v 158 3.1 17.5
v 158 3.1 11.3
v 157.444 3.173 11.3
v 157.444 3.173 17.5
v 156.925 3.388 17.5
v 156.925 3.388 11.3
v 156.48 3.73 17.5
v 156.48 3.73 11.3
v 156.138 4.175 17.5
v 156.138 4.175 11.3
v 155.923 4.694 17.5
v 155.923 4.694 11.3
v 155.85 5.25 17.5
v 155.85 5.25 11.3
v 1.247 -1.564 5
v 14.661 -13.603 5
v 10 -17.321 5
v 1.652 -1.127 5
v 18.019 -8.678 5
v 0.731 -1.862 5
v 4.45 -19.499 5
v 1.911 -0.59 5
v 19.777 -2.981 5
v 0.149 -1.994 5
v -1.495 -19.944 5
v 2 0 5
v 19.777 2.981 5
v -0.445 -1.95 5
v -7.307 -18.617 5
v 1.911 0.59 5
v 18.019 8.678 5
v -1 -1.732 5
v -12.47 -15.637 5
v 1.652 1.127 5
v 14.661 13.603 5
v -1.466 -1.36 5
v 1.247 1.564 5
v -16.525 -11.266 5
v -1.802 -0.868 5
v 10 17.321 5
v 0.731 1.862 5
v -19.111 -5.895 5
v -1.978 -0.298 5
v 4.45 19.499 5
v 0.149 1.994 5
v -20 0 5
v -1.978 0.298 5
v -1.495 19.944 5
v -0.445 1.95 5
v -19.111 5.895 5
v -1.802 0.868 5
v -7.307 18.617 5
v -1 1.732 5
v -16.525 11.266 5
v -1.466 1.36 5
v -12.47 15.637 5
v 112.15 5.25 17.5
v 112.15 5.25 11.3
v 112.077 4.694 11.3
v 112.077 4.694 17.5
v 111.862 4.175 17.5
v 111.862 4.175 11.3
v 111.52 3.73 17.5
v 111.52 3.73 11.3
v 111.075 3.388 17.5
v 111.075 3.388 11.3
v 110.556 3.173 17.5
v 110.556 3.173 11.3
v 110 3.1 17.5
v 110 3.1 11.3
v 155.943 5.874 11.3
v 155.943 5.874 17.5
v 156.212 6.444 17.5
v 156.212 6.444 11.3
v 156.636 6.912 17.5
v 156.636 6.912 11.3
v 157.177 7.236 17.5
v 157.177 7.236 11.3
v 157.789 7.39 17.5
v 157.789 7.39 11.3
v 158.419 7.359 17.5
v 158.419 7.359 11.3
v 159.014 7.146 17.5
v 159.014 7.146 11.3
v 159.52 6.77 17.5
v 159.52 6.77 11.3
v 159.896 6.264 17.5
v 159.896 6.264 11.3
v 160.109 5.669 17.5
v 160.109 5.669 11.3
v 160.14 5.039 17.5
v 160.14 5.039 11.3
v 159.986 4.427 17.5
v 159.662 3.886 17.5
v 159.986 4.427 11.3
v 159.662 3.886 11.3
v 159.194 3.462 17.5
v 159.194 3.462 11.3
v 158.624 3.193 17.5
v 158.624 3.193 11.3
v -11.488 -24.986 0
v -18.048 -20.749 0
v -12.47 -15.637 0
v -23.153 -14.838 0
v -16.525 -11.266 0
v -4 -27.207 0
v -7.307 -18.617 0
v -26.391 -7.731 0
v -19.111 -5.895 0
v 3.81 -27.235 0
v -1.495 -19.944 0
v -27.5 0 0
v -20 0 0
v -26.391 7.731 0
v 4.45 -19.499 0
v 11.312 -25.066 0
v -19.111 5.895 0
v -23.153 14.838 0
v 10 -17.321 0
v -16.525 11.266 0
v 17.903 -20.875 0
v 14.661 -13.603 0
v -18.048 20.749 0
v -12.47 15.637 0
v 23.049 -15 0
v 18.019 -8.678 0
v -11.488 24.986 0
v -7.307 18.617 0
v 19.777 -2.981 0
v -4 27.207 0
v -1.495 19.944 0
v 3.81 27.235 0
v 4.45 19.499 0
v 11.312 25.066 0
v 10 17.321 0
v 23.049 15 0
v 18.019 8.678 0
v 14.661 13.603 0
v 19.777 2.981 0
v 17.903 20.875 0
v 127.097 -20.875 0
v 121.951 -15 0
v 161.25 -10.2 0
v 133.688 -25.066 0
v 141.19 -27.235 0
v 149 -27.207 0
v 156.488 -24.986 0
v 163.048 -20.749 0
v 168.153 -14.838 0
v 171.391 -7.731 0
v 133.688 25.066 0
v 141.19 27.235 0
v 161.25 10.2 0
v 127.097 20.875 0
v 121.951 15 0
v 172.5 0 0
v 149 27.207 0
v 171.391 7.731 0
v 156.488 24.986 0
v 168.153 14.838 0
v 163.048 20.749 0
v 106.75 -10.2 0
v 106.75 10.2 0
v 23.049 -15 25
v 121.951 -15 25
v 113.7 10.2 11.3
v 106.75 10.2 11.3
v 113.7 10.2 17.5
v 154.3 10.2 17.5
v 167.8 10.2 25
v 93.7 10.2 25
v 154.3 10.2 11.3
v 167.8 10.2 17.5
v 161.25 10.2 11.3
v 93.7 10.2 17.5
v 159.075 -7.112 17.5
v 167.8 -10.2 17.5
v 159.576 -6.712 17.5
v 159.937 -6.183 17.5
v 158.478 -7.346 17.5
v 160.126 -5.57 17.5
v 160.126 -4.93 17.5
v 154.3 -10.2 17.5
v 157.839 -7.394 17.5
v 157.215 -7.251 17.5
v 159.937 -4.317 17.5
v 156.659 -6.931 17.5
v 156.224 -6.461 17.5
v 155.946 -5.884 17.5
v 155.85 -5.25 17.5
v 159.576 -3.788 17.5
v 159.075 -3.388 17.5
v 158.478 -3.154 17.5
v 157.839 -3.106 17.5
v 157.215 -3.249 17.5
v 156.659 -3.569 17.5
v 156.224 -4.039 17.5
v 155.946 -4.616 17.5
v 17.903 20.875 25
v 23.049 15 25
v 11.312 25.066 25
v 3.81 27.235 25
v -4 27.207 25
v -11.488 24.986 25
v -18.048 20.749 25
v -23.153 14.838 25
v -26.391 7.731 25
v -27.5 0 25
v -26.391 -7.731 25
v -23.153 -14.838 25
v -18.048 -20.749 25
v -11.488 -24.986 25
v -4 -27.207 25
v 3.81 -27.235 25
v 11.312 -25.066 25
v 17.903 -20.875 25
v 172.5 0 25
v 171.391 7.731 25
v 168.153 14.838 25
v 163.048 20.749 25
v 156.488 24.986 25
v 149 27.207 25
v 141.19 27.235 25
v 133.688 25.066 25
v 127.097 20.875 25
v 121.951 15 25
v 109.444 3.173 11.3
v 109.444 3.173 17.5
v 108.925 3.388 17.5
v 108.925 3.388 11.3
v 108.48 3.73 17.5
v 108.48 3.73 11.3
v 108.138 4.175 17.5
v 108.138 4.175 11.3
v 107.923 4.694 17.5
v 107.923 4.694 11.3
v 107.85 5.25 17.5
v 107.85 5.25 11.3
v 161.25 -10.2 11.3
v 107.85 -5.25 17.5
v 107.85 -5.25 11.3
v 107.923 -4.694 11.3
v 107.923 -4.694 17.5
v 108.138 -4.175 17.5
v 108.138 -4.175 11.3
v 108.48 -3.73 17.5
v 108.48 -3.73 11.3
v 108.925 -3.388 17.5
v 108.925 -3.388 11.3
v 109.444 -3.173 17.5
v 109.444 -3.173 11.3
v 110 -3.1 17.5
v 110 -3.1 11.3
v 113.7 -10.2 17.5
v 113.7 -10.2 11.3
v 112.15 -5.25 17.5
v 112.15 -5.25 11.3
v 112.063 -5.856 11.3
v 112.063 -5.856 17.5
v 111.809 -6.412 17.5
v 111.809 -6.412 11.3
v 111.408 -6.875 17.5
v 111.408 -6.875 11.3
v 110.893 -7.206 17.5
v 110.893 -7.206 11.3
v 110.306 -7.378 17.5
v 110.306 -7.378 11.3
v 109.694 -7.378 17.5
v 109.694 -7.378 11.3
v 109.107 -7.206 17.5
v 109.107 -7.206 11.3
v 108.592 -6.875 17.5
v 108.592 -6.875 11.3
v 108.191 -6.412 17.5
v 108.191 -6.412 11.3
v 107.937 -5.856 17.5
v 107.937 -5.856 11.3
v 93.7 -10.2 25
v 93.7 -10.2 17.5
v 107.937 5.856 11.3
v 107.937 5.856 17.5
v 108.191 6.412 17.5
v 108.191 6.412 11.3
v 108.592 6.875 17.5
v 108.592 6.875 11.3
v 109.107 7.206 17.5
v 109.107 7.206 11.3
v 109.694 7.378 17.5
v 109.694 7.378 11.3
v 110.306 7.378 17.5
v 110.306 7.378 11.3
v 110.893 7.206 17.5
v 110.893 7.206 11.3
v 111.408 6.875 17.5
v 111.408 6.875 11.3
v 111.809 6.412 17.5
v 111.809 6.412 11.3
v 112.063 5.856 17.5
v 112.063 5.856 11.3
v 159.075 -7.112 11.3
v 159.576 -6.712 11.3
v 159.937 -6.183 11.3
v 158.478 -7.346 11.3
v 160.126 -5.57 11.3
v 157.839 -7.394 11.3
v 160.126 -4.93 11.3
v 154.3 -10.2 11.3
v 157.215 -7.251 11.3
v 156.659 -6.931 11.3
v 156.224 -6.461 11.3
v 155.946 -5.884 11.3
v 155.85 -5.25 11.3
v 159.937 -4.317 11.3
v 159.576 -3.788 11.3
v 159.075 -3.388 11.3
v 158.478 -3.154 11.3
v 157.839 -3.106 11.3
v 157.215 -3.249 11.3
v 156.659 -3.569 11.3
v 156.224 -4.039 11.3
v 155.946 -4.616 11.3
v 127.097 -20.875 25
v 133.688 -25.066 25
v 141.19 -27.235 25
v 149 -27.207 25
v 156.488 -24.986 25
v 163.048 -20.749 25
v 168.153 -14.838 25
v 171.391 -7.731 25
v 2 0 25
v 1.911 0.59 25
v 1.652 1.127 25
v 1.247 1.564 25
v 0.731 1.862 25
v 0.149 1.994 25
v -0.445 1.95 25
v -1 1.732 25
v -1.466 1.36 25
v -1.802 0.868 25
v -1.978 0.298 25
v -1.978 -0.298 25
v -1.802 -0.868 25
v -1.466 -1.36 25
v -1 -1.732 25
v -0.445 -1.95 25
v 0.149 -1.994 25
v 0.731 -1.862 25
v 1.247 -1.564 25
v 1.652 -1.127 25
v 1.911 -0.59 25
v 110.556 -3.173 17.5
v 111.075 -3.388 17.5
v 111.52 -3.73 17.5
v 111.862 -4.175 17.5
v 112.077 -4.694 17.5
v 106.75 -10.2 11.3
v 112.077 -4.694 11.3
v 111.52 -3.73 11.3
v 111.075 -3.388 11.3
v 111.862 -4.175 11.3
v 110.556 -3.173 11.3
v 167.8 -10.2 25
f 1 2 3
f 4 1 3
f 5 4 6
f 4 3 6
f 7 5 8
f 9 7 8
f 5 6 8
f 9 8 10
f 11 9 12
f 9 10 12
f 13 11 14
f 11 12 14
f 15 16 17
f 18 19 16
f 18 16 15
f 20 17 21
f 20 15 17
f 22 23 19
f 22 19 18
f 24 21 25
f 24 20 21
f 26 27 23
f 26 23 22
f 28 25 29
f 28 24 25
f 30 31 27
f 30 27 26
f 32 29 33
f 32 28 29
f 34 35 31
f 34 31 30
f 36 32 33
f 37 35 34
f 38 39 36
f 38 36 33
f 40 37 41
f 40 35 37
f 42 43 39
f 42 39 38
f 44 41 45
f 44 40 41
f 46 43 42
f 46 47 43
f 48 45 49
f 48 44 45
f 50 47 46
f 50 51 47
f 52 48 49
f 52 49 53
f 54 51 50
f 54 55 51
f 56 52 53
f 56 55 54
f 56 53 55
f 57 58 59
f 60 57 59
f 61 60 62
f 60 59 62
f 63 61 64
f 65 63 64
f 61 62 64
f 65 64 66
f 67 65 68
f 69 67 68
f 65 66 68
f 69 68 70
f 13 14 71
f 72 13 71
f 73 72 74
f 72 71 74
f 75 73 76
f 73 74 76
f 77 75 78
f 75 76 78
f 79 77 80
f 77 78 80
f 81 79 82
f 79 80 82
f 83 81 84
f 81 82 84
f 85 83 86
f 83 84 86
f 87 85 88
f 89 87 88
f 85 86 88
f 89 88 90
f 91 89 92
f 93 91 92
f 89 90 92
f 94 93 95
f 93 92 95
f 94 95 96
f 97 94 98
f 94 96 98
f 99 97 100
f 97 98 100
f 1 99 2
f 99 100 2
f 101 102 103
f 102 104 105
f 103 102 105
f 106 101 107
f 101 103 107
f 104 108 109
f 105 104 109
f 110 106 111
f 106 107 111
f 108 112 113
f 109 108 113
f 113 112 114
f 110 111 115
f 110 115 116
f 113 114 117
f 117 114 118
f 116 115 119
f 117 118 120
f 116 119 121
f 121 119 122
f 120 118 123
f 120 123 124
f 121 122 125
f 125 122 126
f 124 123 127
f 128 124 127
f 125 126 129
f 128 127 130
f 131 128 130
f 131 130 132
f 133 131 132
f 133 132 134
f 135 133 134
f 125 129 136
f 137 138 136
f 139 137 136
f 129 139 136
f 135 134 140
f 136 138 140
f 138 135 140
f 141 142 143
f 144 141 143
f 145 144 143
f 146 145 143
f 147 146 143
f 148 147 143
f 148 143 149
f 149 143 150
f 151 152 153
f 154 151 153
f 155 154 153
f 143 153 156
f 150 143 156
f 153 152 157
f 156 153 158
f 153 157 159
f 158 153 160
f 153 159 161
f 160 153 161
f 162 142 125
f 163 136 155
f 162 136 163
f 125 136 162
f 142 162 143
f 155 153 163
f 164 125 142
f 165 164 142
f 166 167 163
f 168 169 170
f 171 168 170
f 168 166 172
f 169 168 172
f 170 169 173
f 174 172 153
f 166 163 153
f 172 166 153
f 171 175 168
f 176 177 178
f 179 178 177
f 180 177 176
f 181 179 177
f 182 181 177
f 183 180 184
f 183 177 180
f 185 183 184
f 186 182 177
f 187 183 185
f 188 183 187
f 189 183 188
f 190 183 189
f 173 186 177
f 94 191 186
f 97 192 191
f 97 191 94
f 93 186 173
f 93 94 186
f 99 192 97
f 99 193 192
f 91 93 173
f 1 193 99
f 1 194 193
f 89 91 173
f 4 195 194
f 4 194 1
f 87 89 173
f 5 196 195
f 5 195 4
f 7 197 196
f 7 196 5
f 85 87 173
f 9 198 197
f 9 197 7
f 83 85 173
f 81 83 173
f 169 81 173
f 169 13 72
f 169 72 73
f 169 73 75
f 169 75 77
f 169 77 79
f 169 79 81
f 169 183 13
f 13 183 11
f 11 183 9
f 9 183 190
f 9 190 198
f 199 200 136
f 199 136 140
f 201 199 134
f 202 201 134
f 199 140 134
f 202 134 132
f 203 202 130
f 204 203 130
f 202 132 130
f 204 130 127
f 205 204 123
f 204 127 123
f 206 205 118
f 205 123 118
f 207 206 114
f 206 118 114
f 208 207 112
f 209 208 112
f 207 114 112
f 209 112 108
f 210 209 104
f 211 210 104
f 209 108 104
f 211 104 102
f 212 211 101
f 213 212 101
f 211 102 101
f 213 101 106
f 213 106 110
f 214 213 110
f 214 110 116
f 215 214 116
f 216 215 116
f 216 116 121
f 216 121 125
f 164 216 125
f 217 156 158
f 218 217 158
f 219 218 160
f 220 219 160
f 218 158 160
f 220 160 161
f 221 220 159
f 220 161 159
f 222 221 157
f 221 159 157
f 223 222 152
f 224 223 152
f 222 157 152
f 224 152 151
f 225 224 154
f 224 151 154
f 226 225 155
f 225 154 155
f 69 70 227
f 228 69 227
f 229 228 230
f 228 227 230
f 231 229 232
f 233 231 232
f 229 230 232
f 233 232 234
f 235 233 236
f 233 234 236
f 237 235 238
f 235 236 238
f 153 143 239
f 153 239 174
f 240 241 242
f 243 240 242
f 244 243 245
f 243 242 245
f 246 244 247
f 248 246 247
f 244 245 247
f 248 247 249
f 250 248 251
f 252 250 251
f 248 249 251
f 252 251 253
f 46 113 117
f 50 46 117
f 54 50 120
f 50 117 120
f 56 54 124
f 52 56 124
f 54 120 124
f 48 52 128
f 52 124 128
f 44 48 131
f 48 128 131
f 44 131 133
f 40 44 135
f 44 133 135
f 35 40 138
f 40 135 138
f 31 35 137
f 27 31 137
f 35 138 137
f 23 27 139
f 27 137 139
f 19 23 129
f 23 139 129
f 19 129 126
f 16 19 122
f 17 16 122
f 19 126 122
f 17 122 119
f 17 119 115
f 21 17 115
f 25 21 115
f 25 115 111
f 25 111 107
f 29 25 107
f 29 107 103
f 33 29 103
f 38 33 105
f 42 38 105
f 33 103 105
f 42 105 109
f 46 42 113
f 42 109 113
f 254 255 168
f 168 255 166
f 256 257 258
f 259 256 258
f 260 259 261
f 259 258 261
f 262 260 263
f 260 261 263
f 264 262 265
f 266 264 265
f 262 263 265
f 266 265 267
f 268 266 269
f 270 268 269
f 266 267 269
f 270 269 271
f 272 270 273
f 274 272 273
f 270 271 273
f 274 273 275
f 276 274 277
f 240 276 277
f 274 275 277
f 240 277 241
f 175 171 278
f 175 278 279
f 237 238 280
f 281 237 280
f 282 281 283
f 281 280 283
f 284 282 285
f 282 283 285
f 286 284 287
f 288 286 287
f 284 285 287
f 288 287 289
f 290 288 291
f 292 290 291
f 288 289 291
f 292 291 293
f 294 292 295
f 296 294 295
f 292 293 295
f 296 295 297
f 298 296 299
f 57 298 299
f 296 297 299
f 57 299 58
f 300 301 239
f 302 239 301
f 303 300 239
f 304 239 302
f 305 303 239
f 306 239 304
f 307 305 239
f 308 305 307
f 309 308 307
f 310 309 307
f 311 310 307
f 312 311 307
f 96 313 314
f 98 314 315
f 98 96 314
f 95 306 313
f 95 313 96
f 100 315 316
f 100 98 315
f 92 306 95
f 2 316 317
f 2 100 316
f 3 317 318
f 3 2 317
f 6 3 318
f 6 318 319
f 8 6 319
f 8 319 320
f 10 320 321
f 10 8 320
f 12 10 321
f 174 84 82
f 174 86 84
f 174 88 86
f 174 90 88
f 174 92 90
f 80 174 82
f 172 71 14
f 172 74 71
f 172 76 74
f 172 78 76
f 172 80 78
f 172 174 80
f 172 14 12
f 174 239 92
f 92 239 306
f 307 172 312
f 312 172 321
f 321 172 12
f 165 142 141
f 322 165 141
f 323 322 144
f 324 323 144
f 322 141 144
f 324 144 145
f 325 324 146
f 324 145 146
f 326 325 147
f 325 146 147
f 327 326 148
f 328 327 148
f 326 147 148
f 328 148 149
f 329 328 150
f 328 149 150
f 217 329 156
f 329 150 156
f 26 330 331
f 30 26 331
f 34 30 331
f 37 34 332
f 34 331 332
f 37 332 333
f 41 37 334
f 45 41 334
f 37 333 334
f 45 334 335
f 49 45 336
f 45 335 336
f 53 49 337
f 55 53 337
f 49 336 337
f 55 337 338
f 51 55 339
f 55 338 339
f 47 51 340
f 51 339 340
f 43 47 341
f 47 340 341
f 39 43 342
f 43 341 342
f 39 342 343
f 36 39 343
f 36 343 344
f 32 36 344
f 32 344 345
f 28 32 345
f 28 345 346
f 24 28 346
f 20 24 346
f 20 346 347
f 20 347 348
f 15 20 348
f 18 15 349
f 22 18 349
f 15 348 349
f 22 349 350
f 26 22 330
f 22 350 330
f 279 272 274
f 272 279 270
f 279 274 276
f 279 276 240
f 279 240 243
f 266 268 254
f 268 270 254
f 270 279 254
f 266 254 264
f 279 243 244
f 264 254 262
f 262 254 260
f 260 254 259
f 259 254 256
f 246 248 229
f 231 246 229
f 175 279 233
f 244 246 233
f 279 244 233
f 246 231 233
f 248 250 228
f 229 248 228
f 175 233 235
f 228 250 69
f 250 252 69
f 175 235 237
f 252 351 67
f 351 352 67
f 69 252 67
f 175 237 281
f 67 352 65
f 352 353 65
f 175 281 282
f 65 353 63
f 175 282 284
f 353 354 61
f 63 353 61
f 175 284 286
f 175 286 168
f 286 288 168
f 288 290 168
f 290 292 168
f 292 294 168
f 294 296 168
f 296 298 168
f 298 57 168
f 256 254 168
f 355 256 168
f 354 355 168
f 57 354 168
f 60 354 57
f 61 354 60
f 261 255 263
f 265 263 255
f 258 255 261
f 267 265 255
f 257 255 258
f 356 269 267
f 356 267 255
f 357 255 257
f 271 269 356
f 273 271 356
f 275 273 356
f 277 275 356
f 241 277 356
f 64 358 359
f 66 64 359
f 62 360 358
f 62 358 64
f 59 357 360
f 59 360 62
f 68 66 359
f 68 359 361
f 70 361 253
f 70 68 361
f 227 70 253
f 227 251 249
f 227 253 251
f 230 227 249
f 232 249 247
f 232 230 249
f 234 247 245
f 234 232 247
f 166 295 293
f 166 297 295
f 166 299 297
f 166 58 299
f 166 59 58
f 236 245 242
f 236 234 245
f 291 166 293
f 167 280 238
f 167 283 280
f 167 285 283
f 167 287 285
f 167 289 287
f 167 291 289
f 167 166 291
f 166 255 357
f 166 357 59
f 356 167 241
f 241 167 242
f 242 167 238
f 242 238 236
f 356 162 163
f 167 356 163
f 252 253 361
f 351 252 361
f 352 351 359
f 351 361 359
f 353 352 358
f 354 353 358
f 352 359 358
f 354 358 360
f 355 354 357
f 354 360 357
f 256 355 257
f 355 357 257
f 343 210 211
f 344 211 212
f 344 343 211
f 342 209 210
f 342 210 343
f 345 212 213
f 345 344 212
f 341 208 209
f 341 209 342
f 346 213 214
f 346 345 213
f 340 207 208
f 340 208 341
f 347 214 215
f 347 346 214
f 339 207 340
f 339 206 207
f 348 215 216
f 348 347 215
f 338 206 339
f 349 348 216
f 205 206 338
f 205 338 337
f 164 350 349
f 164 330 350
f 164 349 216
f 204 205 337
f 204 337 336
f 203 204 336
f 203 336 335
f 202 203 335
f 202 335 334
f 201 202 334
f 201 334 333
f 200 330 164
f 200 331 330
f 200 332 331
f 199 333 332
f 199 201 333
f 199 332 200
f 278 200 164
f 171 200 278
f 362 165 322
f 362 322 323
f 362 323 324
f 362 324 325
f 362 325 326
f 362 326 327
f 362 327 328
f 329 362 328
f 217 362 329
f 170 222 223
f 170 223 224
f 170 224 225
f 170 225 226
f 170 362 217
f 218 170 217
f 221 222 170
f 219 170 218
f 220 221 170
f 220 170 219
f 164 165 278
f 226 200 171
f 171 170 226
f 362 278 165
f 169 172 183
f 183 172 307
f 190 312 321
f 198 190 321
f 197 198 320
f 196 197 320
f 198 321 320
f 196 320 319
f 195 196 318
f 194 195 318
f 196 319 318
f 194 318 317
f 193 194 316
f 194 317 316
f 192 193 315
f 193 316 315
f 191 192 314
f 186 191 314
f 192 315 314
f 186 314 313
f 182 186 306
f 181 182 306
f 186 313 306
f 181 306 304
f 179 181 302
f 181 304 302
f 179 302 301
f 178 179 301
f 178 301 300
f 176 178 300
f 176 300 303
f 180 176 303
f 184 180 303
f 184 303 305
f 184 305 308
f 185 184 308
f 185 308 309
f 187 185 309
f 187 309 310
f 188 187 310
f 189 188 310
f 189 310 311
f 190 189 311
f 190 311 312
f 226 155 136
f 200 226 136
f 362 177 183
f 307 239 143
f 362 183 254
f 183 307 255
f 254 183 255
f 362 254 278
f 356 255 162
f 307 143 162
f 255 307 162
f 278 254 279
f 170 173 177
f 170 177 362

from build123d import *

# Parameters (mm, degrees)
BOSS_EXTRUDE1_DEPTH = 25
SKETCH19_R          = 20
CUT_EXTRUDE14_DEPTH = 5
SKETCH22_R          = 2
CUT_EXTRUDE17_DEPTH = 20
SKETCH23_W          = 54.5
SKETCH23_H          = 20.4
SKETCH23_W_2        = 40.6
CUT_EXTRUDE18_DEPTH = 11.3
CUT_EXTRUDE19_DEPTH = 13.7
SKETCH25_W          = 7.5
SKETCH25_H          = 20.4
CUT_EXTRUDE20_DEPTH = 13.5
CUT_EXTRUDE21_DEPTH = 20
SKETCH27_R          = 2.15
CUT_EXTRUDE22_DEPTH = 12


with BuildPart() as part:
    # Sketch1 → Boss-Extrude1 (new body)
    with BuildSketch(Plane.XY):
        with BuildLine():
            ThreePointArc((172.5, 0), (152.823244805, 26.363741023), (121.951138857, 15))
            Line((121.951138857, 15), (145, 15))
            Line((145, 15), (145, -15))
            Line((145, -15), (121.951138857, -15))
            ThreePointArc((121.951138857, -15), (152.823244805, -26.363741023), (172.5, 0))
        make_face()
        with BuildLine():
            Line((145, 15), (121.951138857, 15))
            ThreePointArc((121.951138857, 15), (117.5, 0), (121.951138857, -15))
            Line((121.951138857, -15), (145, -15))
            Line((145, -15), (145, 15))
        make_face()
        with BuildLine():
            Line((121.951138857, 15), (23.048861143, 15))
            ThreePointArc((23.048861143, 15), (26.363741023, 7.823244805), (27.5, 0))
            ThreePointArc((27.5, 0), (26.363741023, -7.823244805), (23.048861143, -15))
            Line((23.048861143, -15), (121.951138857, -15))
            ThreePointArc((121.951138857, -15), (117.5, 0), (121.951138857, 15))
        make_face()
        with BuildLine():
            ThreePointArc((13.228756555, -15), (-20, 0), (13.228756555, 15))
            Line((13.228756555, 15), (23.048861143, 15))
            ThreePointArc((23.048861143, 15), (-27.5, 0), (23.048861143, -15))
            Line((23.048861143, -15), (13.228756555, -15))
        make_face()
        with BuildLine():
            Line((23.048861143, 15), (13.228756555, 15))
            ThreePointArc((13.228756555, 15), (18.228756555, 8.228756555), (20, 0))
            ThreePointArc((20, 0), (18.228756555, -8.228756555), (13.228756555, -15))
            Line((13.228756555, -15), (23.048861143, -15))
            ThreePointArc((23.048861143, -15), (26.363741023, -7.823244805), (27.5, 0))
            ThreePointArc((27.5, 0), (26.363741023, 7.823244805), (23.048861143, 15))
        make_face()
        with BuildLine():
            Line((0, -15), (0, 15))
            Line((0, 15), (13.228756555, 15))
            ThreePointArc((13.228756555, 15), (-20, 0), (13.228756555, -15))
            Line((13.228756555, -15), (0, -15))
        make_face()
        with BuildLine():
            Line((13.228756555, 15), (0, 15))
            Line((0, 15), (0, -15))
            Line((0, -15), (13.228756555, -15))
            ThreePointArc((13.228756555, -15), (18.228756555, -8.228756555), (20, 0))
            ThreePointArc((20, 0), (18.228756555, 8.228756555), (13.228756555, 15))
        make_face()
    extrude(amount=BOSS_EXTRUDE1_DEPTH)

    # Sketch19 → Cut-Extrude14 (cut)
    with BuildSketch(Plane(origin=(0, 0, 0), x_dir=(-1, 0, 0), z_dir=(0, 0, -1))):
        Circle(SKETCH19_R)
    extrude(amount=-CUT_EXTRUDE14_DEPTH, mode=Mode.SUBTRACT)

    # Sketch22 → Cut-Extrude17 (cut)
    with BuildSketch(Plane.XY.offset(25)):
        Circle(SKETCH22_R)
    extrude(amount=-CUT_EXTRUDE17_DEPTH, mode=Mode.SUBTRACT)

    # Sketch23 → Cut-Extrude18 (cut)
    with BuildSketch(Plane(origin=(0, 0, 0), x_dir=(-1, 0, 0), z_dir=(0, 0, -1))):
        with Locations((-134, 0)):
            Rectangle(SKETCH23_W, SKETCH23_H)
        with Locations((-134, 0)):
            Rectangle(SKETCH23_W_2, SKETCH23_H)
    extrude(amount=-CUT_EXTRUDE18_DEPTH, mode=Mode.SUBTRACT)

    # Sketch24 → Cut-Extrude19 (cut)
    with BuildSketch(Plane(origin=(0, 0, 11.3), x_dir=(-1, 0, 0), z_dir=(0, 0, -1))):
        Polygon((-154.3, -0.627488927), (-154.3, -10.2), (-113.7, -10.2), (-113.7, 10.2), (-154.3, 10.2), align=None)
    extrude(amount=-CUT_EXTRUDE19_DEPTH, mode=Mode.SUBTRACT)

    # Sketch25 → Cut-Extrude20 (cut)
    with BuildSketch(Plane.ZY.offset(-154.3)):
        with Locations((21.25, 0)):
            Rectangle(SKETCH25_W, SKETCH25_H)
    extrude(amount=-CUT_EXTRUDE20_DEPTH, mode=Mode.SUBTRACT)

    # Sketch26 → Cut-Extrude21 (cut)
    with BuildSketch(Plane(origin=(113.7, 0, 0), x_dir=(0, 0, -1), z_dir=(1, 0, 0))):
        Polygon((-25, 10.2), (-25, -10.2), (-17.5, -10.2), (-17.5, 10.2), (-21.25, 10.2), align=None)
    extrude(amount=-CUT_EXTRUDE21_DEPTH, mode=Mode.SUBTRACT)

    # Sketch27 → Cut-Extrude22 (cut)
    with BuildSketch(Plane(origin=(0, 0, 11.3), x_dir=(-1, 0, 0), z_dir=(0, 0, -1))):
        with BuildLine():
            ThreePointArc((-107.85, 5.25), (-110, 7.4), (-112.15, 5.25))
            Line((-112.15, 5.25), (-110, 5.25))
            Line((-110, 5.25), (-110, 3.1))
            ThreePointArc((-110, 3.1), (-108.47972042, 3.72972042), (-107.85, 5.25))
        make_face()
        with BuildLine():
            Line((-110, 5.25), (-112.15, 5.25))
            ThreePointArc((-112.15, 5.25), (-111.52027958, 3.72972042), (-110, 3.1))
            Line((-110, 3.1), (-110, 5.25))
        make_face()
        with BuildLine():
            ThreePointArc((-110, -3.1), (-111.52027958, -3.72972042), (-112.15, -5.25))
            Line((-112.15, -5.25), (-110, -5.25))
            Line((-110, -5.25), (-110, -3.1))
        make_face()
        with BuildLine():
            Line((-110, -5.25), (-112.15, -5.25))
            ThreePointArc((-112.15, -5.25), (-110, -7.4), (-107.85, -5.25))
            ThreePointArc((-107.85, -5.25), (-108.47972042, -3.72972042), (-110, -3.1))
            Line((-110, -3.1), (-110, -5.25))
        make_face()
        with BuildLine():
            ThreePointArc((-155.85, 5.25), (-159.52027958, 6.77027958), (-158, 3.1))
            Line((-158, 3.1), (-158, 5.25))
            Line((-158, 5.25), (-155.85, 5.25))
        make_face()
        with BuildLine():
            Line((-158, 5.25), (-158, 3.1))
            ThreePointArc((-158, 3.1), (-156.47972042, 3.72972042), (-155.85, 5.25))
            Line((-155.85, 5.25), (-158, 5.25))
        make_face()
        with Locations((-158, -5.25)):
            Circle(SKETCH27_R)
    extrude(amount=-CUT_EXTRUDE22_DEPTH, mode=Mode.SUBTRACT)


solid = part.part
